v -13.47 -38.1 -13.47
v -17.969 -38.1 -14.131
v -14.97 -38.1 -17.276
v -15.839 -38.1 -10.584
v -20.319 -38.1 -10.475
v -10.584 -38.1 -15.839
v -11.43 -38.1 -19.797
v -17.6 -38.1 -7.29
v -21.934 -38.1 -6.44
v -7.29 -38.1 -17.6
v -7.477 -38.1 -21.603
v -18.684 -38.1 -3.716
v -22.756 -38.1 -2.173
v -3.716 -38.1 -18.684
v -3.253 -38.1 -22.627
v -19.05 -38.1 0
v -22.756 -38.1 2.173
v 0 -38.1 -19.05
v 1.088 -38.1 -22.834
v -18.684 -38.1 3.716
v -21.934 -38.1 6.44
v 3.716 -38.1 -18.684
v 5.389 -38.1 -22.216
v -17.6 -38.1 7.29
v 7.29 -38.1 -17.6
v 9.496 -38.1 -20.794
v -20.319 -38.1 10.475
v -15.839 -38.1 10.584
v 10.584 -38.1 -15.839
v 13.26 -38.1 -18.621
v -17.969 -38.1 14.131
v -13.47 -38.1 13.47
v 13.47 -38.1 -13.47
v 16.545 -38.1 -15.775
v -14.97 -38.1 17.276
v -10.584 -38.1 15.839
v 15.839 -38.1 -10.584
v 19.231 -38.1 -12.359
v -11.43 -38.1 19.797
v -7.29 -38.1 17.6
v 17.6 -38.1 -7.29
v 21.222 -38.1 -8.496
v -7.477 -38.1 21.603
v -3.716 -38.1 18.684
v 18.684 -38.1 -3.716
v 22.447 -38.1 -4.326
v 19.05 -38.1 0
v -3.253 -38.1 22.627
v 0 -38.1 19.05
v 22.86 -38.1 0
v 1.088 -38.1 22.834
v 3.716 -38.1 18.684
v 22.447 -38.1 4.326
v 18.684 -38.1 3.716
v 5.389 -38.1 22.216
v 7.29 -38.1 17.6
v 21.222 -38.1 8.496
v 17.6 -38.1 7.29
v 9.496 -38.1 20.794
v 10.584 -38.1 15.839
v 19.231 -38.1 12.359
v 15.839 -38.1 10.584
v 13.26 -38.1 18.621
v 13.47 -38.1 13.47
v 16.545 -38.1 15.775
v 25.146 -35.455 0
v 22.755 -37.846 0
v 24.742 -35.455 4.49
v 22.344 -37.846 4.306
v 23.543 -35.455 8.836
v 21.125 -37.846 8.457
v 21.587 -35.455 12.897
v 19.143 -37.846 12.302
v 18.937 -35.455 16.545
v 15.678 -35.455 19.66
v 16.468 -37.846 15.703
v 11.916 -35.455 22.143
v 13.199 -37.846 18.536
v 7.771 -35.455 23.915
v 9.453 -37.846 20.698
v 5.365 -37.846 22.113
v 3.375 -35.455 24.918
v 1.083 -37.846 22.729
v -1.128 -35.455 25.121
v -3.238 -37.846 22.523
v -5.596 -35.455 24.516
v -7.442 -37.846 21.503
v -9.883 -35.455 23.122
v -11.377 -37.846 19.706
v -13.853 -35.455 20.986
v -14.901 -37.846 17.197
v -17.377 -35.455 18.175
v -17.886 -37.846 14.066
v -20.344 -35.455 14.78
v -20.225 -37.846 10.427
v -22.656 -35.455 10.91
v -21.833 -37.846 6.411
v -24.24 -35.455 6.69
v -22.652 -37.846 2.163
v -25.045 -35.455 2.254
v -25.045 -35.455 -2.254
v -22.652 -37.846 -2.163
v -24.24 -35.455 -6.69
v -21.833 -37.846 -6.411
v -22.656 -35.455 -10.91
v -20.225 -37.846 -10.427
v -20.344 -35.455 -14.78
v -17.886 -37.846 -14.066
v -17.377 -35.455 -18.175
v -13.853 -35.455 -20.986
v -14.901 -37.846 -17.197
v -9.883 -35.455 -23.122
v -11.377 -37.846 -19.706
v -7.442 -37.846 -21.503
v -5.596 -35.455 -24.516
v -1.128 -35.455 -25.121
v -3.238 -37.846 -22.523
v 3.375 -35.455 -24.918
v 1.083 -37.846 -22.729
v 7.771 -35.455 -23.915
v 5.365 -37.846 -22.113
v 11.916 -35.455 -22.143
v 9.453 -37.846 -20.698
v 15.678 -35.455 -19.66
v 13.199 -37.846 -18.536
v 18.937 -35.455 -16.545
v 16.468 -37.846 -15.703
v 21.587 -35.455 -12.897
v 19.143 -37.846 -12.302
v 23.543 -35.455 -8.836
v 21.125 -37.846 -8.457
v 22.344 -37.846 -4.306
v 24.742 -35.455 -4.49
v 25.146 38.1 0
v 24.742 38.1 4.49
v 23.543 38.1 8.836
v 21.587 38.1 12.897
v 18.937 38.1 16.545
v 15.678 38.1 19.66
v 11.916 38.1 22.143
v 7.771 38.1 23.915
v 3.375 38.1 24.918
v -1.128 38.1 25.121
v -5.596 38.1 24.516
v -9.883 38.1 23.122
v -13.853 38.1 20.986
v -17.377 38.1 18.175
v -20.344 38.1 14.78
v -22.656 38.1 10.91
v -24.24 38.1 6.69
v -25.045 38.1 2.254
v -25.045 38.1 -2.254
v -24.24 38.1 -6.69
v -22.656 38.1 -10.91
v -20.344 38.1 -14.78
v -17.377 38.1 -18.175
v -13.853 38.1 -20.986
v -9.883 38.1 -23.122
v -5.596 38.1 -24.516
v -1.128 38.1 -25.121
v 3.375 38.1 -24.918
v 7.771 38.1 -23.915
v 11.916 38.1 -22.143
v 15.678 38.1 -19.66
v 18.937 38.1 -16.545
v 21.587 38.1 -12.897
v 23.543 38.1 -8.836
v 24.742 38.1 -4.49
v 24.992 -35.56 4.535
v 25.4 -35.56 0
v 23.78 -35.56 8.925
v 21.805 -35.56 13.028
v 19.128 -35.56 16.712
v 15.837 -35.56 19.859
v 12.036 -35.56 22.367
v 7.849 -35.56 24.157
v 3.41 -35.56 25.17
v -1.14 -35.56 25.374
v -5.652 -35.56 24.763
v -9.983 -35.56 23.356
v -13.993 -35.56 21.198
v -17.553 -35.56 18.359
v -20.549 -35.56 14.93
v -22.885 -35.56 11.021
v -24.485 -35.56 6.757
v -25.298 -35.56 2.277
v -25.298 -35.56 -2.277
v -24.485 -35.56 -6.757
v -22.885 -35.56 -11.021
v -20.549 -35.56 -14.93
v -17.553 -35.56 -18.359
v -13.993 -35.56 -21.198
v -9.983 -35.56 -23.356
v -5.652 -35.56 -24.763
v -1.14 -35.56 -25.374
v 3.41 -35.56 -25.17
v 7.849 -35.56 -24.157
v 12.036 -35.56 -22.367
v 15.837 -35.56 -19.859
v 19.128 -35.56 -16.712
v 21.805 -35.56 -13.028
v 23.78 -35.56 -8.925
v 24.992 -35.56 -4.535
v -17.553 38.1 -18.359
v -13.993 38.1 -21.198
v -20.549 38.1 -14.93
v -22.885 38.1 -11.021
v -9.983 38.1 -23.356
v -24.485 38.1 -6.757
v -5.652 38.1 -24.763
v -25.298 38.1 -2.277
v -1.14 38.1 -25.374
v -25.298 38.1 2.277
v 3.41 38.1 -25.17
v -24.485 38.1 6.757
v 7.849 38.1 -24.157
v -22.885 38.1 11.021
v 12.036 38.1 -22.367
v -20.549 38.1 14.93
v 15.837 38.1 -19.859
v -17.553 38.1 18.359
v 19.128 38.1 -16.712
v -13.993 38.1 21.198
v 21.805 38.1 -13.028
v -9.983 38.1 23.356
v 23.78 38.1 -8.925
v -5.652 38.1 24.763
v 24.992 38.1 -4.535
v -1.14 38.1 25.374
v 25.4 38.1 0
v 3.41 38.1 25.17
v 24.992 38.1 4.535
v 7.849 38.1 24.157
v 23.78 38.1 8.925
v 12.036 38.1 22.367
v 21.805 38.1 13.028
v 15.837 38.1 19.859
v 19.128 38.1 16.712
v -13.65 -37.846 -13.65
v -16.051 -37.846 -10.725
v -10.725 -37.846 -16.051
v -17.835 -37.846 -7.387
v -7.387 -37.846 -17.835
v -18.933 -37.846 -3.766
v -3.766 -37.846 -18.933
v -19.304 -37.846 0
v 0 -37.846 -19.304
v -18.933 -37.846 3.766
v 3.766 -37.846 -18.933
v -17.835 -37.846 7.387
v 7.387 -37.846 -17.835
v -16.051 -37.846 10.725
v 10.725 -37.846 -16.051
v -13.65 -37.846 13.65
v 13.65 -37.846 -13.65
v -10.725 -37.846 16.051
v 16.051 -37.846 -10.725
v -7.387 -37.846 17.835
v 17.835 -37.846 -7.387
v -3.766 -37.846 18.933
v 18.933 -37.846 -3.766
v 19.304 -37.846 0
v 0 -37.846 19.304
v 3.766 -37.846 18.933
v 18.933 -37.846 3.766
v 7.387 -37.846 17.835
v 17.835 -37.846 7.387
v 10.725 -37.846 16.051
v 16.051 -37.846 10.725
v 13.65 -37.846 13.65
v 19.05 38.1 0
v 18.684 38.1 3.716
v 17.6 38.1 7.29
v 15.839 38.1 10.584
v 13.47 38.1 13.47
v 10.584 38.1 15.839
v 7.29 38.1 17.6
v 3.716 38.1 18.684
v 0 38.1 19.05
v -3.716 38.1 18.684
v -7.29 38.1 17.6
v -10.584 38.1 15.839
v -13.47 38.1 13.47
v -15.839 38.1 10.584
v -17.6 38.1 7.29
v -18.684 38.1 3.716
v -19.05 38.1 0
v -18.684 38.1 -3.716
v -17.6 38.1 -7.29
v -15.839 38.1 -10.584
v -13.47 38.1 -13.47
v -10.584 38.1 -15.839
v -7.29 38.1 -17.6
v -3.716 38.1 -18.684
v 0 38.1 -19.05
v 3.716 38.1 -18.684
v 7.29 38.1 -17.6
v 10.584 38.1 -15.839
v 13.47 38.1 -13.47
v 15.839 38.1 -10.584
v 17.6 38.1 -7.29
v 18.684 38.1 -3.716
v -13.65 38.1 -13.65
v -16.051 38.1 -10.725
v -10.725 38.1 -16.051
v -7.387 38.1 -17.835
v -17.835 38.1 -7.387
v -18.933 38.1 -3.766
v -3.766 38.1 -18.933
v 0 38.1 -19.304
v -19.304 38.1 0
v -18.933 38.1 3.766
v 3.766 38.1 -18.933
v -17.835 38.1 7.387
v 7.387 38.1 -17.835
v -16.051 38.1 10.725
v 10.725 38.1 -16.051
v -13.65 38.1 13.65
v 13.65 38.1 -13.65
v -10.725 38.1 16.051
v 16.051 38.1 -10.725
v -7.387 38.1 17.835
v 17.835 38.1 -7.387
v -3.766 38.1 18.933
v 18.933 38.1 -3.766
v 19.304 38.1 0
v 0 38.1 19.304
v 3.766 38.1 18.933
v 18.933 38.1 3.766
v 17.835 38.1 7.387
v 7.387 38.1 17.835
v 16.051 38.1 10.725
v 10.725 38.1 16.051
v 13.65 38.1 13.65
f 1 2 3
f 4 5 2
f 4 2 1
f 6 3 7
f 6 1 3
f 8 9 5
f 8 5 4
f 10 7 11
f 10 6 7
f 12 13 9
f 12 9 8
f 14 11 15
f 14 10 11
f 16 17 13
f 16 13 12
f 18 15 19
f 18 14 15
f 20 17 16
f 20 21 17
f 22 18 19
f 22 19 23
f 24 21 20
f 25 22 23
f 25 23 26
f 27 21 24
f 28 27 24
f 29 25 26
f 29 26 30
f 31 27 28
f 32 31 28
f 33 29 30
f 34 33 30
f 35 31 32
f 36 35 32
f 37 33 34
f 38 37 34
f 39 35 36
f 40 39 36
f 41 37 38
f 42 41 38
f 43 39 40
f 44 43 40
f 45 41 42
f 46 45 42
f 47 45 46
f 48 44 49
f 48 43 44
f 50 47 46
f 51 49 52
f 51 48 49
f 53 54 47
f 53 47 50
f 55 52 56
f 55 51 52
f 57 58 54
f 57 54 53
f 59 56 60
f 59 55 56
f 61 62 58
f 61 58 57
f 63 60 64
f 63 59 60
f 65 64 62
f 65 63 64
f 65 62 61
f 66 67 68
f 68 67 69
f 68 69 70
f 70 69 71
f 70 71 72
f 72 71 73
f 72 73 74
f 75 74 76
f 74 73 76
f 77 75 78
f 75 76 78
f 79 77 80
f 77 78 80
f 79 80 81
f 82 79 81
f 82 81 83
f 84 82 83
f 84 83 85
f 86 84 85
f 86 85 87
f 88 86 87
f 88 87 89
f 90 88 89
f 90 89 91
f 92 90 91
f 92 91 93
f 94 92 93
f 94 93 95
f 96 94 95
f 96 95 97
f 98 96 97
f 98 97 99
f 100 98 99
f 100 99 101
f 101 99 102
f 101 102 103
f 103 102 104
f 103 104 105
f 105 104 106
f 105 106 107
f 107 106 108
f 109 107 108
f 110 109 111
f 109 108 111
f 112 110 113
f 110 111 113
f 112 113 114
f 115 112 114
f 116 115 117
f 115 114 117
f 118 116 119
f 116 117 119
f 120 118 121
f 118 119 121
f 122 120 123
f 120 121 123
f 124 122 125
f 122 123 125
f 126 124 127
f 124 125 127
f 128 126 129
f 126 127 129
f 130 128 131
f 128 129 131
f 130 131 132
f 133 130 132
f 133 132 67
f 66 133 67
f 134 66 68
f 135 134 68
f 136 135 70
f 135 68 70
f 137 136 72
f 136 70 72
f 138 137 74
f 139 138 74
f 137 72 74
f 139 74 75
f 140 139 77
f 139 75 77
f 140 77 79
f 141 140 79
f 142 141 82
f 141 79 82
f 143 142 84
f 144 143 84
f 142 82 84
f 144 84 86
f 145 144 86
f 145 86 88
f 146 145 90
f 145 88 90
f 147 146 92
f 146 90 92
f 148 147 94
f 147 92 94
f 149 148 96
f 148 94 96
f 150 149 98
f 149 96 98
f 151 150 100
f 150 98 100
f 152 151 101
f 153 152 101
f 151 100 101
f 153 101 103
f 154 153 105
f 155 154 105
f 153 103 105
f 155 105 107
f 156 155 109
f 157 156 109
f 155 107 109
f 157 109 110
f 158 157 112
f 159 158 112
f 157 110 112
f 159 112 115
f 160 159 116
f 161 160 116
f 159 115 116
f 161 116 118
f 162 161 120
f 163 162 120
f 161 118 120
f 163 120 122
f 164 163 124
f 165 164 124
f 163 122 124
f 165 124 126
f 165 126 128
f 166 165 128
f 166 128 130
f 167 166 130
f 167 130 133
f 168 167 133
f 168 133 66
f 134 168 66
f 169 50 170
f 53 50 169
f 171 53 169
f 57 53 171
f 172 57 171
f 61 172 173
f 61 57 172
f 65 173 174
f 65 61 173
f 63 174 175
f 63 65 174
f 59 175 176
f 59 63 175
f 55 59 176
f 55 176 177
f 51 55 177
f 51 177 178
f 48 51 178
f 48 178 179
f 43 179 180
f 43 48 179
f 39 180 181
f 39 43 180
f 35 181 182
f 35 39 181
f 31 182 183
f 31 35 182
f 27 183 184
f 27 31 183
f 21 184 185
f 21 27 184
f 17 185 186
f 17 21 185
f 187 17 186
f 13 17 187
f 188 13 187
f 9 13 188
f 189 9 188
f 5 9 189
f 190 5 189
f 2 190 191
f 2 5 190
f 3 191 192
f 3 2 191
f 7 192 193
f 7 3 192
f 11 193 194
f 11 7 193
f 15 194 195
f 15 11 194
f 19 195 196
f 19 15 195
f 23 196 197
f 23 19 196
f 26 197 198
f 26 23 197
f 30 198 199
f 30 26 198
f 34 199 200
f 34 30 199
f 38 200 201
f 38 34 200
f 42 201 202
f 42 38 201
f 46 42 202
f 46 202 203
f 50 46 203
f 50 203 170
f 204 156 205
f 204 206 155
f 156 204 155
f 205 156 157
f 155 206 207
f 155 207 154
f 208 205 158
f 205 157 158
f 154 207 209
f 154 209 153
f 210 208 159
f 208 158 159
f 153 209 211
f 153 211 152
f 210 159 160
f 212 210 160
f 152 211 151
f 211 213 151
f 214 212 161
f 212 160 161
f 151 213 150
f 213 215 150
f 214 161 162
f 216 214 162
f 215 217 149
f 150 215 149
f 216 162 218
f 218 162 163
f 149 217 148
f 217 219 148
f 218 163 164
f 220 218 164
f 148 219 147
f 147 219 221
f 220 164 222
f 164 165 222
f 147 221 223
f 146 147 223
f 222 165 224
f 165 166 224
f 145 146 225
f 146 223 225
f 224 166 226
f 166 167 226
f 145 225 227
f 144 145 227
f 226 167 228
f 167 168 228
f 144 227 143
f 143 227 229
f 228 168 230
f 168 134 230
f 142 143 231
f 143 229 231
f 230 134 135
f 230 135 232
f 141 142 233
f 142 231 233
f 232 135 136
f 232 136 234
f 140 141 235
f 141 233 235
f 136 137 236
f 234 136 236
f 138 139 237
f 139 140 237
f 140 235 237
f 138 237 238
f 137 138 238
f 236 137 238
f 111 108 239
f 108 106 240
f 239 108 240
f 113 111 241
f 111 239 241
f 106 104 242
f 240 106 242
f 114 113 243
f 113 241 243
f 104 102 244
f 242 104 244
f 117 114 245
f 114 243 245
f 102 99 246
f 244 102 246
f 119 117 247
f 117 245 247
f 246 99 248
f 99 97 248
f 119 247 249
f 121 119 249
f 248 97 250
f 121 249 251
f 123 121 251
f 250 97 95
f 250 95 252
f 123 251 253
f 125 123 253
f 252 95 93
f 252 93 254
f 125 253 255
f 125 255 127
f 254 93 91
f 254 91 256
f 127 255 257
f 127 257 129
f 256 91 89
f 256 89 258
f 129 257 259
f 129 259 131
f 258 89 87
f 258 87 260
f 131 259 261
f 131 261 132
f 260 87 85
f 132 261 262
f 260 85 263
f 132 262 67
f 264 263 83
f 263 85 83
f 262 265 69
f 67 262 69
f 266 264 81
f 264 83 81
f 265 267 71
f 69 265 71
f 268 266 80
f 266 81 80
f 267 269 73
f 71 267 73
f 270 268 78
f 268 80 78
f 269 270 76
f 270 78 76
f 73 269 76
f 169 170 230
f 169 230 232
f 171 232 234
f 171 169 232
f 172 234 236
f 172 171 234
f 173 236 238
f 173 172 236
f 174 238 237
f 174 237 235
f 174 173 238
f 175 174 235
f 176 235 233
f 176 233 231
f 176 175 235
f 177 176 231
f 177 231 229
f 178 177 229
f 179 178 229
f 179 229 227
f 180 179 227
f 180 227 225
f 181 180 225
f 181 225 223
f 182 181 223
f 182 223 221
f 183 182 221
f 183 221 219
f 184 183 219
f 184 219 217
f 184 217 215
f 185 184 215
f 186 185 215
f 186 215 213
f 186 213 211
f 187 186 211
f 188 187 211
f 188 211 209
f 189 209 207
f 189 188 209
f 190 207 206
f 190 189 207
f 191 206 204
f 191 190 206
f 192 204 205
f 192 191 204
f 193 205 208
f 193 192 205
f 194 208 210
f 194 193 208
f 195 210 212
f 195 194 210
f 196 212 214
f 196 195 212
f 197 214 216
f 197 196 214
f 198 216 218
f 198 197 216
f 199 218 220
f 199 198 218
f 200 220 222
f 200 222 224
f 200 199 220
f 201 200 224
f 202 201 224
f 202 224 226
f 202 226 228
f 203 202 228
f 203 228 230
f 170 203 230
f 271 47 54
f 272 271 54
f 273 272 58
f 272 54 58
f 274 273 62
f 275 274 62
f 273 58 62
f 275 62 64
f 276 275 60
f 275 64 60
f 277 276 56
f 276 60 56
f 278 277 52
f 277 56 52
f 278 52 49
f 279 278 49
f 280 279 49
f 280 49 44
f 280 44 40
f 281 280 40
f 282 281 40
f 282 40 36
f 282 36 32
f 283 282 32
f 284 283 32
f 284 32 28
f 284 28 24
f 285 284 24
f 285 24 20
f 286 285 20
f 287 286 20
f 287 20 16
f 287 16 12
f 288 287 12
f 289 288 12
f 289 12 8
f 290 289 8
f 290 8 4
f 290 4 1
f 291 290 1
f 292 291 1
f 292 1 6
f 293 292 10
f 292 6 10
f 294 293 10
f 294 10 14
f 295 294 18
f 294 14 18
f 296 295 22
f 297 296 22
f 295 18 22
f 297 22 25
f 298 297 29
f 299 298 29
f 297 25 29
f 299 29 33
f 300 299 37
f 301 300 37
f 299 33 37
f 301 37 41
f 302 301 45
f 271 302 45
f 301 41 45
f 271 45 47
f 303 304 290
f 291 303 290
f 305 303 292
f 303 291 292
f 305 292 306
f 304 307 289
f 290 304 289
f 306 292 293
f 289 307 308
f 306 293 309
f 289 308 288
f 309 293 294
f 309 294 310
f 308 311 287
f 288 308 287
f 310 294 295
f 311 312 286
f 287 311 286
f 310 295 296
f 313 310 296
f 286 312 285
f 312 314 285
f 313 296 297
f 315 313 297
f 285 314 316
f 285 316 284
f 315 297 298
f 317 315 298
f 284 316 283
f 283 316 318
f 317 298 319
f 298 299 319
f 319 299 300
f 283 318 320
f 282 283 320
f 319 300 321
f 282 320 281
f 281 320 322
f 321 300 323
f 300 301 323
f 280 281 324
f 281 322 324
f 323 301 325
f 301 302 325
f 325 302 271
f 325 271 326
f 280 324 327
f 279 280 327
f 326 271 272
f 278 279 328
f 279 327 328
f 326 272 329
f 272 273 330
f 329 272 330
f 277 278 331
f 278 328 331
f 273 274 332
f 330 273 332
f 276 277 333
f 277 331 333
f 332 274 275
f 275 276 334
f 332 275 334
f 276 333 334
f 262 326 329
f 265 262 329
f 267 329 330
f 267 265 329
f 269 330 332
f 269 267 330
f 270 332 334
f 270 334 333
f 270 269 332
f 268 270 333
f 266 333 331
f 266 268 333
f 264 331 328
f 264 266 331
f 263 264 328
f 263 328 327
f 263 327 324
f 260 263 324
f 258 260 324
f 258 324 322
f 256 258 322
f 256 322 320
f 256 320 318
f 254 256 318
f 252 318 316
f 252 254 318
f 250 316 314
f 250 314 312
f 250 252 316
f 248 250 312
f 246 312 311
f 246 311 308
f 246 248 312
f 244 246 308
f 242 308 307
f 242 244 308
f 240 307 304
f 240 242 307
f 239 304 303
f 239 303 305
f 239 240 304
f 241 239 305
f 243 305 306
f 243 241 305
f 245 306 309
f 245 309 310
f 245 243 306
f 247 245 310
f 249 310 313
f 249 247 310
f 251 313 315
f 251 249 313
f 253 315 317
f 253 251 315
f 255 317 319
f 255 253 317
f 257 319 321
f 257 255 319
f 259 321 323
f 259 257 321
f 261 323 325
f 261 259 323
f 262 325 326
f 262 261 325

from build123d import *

# Parameters (mm, degrees)
F0_R     = 25.4
F1_DEPTH = 38.1
F2_R     = 19.05
F3_DEPTH = 76.201
F4_SIZE  = 2.54
F5_T     = -0.254


with BuildPart() as f1:
    # F0 (on Front) → F1 (new body, symmetric)
    with BuildSketch(Plane.XZ):
        Circle(F0_R)
    extrude(amount=F1_DEPTH, both=True)

    # F2 (on face) → F3 (cut, through all)
    with BuildSketch(Plane.XZ.offset(38.1)):
        Circle(F2_R)
    extrude(amount=-F3_DEPTH, mode=Mode.SUBTRACT)

    # F4
    f4_edges = [f1.edges().sort_by_distance(p)[0] for p in [
        (-25.4, -38.1, 0),
    ]]
    chamfer(f4_edges, length=F4_SIZE)

    # F5
    f5_openings = [f1.faces().sort_by_distance(p)[0] for p in [
        (-24.68158, 38.1, 0),
    ]]
    offset(amount=F5_T, openings=f5_openings)


solid = f1.part
